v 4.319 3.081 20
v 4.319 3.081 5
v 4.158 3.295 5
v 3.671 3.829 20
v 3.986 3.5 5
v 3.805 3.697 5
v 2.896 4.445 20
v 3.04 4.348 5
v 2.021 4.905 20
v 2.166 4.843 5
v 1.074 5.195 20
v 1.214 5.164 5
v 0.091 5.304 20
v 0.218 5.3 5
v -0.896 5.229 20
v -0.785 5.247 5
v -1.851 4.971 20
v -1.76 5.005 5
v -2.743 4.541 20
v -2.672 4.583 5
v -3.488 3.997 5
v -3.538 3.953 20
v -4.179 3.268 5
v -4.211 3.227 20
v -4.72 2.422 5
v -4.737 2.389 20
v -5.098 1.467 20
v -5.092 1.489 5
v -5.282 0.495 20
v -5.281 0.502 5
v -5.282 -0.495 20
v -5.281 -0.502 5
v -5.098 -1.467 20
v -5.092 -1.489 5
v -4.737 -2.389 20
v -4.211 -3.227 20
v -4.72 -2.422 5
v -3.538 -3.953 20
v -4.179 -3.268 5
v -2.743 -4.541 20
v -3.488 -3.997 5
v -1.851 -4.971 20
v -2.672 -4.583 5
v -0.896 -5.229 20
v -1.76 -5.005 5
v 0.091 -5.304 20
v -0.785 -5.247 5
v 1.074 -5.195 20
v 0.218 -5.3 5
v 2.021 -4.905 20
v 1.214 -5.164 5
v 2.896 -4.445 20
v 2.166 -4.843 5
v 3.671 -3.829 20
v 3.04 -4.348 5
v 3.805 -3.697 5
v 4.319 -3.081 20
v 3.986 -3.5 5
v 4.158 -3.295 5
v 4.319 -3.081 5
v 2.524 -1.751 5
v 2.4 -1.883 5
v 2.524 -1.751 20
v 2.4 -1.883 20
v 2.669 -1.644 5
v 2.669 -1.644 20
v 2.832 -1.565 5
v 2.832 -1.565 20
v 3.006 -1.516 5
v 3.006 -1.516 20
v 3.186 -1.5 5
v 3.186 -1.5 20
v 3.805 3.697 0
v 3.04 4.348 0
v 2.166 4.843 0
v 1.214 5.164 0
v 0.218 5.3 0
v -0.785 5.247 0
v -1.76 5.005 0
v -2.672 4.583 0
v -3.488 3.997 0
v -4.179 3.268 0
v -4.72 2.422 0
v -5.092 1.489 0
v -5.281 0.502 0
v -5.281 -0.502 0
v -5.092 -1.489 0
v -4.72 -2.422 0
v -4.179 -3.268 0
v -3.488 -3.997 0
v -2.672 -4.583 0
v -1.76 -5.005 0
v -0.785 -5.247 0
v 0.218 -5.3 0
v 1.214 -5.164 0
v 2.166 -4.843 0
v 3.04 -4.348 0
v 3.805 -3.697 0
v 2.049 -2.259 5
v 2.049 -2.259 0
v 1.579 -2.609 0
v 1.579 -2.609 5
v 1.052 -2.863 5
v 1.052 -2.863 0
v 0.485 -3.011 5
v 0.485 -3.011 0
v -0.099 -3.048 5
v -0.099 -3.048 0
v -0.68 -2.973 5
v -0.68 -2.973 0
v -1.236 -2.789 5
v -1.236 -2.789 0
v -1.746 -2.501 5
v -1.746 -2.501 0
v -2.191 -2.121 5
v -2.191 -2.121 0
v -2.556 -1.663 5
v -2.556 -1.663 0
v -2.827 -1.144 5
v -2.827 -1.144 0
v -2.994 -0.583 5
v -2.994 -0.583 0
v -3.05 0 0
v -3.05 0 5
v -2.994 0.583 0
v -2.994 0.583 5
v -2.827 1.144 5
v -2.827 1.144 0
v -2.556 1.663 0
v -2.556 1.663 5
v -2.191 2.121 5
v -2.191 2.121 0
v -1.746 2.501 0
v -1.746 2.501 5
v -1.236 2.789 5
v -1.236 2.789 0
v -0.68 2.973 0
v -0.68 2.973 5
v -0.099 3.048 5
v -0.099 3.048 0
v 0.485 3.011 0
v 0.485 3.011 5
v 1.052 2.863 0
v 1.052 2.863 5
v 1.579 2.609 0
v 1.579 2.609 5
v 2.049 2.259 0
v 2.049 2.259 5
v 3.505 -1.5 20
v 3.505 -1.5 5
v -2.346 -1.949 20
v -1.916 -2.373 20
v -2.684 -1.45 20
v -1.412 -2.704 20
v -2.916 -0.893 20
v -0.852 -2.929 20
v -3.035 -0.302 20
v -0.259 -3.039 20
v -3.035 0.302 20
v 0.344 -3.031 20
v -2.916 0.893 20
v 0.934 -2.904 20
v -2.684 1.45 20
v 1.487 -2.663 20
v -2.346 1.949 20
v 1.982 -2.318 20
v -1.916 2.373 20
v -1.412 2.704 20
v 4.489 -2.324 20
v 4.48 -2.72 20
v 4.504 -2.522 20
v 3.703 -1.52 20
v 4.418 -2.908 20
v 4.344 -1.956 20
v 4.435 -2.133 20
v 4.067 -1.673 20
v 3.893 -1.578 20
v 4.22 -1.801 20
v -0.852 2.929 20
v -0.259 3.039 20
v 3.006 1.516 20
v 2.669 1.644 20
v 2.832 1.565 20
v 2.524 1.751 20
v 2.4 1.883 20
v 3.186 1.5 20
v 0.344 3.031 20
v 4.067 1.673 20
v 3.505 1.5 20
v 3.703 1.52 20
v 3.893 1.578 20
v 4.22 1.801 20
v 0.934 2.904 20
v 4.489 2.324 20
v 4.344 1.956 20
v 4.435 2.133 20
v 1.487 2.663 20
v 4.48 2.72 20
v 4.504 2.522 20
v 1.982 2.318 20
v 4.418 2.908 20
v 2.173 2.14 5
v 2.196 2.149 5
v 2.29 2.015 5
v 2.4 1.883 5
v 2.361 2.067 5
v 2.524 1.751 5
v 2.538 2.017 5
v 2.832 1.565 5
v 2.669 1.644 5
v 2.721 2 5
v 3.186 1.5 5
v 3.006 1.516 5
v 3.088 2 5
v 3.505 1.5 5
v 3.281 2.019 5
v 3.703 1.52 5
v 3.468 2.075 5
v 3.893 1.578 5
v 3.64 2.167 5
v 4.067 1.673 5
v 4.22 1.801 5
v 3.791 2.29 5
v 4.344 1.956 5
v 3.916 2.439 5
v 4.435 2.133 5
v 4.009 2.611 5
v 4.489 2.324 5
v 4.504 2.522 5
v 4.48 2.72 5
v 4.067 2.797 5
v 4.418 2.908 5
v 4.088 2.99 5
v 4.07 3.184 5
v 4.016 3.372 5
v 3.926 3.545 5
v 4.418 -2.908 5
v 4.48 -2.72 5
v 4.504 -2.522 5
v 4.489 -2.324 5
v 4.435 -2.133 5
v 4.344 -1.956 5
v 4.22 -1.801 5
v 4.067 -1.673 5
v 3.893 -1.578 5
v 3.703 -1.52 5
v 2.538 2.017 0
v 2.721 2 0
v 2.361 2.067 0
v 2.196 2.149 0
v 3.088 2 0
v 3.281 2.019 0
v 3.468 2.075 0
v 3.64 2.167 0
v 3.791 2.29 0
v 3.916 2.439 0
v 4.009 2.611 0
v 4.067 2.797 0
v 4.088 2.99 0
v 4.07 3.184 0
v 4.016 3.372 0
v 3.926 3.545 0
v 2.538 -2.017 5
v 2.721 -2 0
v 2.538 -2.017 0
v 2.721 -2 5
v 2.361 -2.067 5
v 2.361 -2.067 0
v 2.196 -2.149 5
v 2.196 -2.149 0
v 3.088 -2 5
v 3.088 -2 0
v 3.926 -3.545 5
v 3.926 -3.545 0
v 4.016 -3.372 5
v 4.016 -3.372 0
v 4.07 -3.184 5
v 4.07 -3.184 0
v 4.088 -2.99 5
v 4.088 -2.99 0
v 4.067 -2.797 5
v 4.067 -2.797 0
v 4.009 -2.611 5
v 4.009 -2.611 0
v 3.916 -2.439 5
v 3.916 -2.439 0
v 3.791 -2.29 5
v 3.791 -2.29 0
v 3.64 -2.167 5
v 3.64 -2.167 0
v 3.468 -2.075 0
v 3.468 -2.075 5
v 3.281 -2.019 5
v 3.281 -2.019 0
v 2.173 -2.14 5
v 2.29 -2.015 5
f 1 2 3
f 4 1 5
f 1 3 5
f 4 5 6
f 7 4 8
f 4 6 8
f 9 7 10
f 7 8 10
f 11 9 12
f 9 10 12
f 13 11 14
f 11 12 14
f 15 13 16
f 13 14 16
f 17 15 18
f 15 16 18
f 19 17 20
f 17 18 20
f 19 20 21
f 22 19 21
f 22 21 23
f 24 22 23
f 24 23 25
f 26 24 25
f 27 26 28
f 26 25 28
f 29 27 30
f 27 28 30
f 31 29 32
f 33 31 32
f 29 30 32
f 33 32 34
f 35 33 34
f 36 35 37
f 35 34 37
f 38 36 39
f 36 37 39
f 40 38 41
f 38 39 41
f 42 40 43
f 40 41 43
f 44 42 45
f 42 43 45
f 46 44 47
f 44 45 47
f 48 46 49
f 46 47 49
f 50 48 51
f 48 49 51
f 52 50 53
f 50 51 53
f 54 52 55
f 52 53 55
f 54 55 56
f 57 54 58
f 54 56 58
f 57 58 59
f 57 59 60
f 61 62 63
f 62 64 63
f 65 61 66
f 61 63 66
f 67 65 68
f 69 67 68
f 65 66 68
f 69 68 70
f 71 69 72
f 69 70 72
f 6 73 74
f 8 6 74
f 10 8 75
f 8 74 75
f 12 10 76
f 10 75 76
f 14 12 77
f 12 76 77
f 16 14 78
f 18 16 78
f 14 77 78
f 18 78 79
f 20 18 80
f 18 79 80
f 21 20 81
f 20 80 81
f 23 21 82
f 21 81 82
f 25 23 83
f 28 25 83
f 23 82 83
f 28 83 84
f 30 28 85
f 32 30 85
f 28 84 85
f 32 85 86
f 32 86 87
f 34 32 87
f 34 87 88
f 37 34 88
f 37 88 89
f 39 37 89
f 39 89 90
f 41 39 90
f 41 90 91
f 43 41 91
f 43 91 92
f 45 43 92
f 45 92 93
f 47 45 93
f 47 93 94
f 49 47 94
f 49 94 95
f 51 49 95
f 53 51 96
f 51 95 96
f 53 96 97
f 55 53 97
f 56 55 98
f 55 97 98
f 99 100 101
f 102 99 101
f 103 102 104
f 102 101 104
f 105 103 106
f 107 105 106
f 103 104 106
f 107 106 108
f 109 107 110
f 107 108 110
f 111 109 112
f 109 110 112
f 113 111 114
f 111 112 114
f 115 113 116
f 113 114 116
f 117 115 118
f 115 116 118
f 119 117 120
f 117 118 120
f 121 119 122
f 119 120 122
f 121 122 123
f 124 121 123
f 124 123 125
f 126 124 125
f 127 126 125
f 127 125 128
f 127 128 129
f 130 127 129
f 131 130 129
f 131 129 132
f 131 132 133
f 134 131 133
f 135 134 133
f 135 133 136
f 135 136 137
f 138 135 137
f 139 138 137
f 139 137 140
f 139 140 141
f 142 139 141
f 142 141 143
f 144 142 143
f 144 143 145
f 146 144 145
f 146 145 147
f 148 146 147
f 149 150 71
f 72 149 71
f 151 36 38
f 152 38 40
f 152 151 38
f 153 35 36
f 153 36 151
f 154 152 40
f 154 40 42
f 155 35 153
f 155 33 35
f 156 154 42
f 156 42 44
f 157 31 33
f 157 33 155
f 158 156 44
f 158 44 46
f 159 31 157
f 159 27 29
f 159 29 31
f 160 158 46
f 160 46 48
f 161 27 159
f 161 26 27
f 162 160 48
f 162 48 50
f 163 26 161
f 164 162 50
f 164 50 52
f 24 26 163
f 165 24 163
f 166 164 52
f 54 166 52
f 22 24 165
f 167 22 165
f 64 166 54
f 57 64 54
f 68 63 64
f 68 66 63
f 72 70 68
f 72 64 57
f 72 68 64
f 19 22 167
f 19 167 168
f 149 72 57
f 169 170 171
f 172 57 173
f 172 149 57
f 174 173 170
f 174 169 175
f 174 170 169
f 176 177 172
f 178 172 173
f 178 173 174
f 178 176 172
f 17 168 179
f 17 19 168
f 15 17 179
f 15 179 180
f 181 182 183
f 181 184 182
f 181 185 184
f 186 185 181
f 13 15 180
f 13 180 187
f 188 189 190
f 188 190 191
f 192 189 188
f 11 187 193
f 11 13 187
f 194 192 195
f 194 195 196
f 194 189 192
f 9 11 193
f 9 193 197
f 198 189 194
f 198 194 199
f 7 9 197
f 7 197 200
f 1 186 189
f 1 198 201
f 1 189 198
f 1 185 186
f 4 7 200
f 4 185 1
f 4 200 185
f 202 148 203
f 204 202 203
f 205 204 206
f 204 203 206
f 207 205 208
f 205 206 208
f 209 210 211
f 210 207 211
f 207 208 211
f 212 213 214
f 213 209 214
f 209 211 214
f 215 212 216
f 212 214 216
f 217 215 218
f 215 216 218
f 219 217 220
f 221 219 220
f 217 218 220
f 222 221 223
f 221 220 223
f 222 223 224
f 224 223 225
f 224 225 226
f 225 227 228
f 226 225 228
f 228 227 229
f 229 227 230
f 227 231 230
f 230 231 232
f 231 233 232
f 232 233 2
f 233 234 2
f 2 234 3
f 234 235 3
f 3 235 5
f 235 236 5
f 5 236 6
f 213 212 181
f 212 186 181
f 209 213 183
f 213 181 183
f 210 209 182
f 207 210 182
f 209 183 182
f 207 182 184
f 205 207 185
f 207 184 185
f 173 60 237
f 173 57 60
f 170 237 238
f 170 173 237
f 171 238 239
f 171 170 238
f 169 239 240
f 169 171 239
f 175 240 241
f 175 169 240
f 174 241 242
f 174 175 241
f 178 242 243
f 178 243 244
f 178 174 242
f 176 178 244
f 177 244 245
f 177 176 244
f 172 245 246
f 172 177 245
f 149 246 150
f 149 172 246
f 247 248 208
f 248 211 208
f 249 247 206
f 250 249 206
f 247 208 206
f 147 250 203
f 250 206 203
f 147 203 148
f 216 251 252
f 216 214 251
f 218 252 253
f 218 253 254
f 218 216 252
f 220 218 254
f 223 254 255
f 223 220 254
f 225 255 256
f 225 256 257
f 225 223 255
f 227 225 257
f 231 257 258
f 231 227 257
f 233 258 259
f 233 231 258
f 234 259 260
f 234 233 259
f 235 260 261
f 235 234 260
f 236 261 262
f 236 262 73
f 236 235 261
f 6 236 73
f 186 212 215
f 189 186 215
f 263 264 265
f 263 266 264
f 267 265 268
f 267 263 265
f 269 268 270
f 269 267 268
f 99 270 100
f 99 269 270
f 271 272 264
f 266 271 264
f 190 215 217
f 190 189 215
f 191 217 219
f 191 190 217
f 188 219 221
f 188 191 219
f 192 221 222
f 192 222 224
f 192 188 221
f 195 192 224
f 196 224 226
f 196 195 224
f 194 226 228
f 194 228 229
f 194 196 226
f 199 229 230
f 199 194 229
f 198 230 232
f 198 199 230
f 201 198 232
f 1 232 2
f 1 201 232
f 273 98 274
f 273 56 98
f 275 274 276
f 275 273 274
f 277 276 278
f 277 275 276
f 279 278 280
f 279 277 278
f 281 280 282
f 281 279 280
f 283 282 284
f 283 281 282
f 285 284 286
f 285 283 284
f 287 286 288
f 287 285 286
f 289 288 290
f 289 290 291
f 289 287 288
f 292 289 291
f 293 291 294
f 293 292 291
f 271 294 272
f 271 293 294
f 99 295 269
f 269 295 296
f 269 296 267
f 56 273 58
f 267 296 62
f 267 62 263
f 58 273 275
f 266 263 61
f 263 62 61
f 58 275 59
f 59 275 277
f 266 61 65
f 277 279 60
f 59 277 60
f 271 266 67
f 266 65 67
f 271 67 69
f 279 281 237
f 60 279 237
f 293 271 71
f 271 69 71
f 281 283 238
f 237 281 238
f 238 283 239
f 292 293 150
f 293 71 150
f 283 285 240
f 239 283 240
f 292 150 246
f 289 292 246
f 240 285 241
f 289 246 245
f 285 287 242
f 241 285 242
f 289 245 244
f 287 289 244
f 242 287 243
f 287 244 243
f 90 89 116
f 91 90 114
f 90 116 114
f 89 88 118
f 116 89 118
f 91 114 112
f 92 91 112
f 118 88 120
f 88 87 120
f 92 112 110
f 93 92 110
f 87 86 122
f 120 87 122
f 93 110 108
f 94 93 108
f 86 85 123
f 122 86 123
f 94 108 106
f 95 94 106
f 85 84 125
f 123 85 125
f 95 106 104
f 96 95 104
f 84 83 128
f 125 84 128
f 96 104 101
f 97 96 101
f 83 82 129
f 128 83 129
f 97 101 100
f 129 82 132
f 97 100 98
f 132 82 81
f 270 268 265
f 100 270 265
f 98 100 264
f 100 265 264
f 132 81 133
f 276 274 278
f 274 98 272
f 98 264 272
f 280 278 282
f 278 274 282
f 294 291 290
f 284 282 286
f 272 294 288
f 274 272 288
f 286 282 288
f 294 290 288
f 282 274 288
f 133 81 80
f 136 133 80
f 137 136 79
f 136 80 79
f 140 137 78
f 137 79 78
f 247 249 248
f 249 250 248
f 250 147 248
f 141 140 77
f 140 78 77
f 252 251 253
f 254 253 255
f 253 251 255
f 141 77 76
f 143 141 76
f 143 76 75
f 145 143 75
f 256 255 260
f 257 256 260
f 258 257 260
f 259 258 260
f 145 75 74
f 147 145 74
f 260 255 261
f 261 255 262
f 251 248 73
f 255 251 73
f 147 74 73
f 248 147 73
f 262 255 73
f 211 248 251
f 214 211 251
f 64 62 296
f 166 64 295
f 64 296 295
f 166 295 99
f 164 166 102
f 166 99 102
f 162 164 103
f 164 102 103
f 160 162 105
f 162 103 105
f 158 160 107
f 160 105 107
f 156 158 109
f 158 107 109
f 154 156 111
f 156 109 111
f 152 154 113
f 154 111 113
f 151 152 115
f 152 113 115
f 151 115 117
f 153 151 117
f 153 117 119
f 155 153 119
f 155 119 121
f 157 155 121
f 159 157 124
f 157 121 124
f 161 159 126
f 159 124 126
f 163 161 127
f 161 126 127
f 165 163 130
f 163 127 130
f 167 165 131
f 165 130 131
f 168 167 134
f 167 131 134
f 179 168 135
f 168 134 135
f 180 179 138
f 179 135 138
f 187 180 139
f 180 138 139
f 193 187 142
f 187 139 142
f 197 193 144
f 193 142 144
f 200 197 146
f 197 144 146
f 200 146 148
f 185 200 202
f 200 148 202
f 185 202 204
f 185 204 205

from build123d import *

# Parameters (mm, degrees)
F1_DEPTH = 5
F2_R     = 1
F4_START = 5
F4_DEPTH = 15
F5_R     = 1


with BuildPart() as f1:
    # F0 (on Top) → F1 (new body)
    with BuildSketch(Plane.XY):
        with BuildLine():
            Line((2.3027157879, 2), (4.9135552302, 2))
            ThreePointArc((4.9135552302, 2), (-5.305, 0), (4.9135552302, -2))
            Line((4.9135552302, -2), (2.3027157879, -2))
            ThreePointArc((2.3027157879, -2), (-3.05, 0), (2.3027157879, 2))
        make_face()
    extrude(amount=F1_DEPTH)

    # F2
    f2_edges = [f1.edges().sort_by_distance(p)[0] for p in [
        (4.913555, 2, 2.5),
        (2.302716, 2, 2.5),
        (2.302716, -2, 2.5),
        (4.913555, -2, 2.5),
    ]]
    fillet(f2_edges, radius=F2_R)

    # F3 (on Top) → F4 (join)
    with BuildSketch(Plane.XY.offset(F4_START)):
        with BuildLine():
            Line((2.655654345, 1.5), (5.0885189397, 1.5))
            ThreePointArc((5.0885189397, 1.5), (-5.305, 0), (5.0885189397, -1.5))
            Line((5.0885189397, -1.5), (2.655654345, -1.5))
            ThreePointArc((2.655654345, -1.5), (-3.05, 0), (2.655654345, 1.5))
        make_face()
    extrude(amount=F4_DEPTH)

    # F5
    f5_edges = [f1.edges().sort_by_distance(p)[0] for p in [
        (5.088519, -1.5, 12.5),
        (5.088519, 1.5, 12.5),
        (2.655654, -1.5, 12.5),
        (2.655654, 1.5, 12.5),
    ]]
    fillet(f5_edges, radius=F5_R)


solid = f1.part
